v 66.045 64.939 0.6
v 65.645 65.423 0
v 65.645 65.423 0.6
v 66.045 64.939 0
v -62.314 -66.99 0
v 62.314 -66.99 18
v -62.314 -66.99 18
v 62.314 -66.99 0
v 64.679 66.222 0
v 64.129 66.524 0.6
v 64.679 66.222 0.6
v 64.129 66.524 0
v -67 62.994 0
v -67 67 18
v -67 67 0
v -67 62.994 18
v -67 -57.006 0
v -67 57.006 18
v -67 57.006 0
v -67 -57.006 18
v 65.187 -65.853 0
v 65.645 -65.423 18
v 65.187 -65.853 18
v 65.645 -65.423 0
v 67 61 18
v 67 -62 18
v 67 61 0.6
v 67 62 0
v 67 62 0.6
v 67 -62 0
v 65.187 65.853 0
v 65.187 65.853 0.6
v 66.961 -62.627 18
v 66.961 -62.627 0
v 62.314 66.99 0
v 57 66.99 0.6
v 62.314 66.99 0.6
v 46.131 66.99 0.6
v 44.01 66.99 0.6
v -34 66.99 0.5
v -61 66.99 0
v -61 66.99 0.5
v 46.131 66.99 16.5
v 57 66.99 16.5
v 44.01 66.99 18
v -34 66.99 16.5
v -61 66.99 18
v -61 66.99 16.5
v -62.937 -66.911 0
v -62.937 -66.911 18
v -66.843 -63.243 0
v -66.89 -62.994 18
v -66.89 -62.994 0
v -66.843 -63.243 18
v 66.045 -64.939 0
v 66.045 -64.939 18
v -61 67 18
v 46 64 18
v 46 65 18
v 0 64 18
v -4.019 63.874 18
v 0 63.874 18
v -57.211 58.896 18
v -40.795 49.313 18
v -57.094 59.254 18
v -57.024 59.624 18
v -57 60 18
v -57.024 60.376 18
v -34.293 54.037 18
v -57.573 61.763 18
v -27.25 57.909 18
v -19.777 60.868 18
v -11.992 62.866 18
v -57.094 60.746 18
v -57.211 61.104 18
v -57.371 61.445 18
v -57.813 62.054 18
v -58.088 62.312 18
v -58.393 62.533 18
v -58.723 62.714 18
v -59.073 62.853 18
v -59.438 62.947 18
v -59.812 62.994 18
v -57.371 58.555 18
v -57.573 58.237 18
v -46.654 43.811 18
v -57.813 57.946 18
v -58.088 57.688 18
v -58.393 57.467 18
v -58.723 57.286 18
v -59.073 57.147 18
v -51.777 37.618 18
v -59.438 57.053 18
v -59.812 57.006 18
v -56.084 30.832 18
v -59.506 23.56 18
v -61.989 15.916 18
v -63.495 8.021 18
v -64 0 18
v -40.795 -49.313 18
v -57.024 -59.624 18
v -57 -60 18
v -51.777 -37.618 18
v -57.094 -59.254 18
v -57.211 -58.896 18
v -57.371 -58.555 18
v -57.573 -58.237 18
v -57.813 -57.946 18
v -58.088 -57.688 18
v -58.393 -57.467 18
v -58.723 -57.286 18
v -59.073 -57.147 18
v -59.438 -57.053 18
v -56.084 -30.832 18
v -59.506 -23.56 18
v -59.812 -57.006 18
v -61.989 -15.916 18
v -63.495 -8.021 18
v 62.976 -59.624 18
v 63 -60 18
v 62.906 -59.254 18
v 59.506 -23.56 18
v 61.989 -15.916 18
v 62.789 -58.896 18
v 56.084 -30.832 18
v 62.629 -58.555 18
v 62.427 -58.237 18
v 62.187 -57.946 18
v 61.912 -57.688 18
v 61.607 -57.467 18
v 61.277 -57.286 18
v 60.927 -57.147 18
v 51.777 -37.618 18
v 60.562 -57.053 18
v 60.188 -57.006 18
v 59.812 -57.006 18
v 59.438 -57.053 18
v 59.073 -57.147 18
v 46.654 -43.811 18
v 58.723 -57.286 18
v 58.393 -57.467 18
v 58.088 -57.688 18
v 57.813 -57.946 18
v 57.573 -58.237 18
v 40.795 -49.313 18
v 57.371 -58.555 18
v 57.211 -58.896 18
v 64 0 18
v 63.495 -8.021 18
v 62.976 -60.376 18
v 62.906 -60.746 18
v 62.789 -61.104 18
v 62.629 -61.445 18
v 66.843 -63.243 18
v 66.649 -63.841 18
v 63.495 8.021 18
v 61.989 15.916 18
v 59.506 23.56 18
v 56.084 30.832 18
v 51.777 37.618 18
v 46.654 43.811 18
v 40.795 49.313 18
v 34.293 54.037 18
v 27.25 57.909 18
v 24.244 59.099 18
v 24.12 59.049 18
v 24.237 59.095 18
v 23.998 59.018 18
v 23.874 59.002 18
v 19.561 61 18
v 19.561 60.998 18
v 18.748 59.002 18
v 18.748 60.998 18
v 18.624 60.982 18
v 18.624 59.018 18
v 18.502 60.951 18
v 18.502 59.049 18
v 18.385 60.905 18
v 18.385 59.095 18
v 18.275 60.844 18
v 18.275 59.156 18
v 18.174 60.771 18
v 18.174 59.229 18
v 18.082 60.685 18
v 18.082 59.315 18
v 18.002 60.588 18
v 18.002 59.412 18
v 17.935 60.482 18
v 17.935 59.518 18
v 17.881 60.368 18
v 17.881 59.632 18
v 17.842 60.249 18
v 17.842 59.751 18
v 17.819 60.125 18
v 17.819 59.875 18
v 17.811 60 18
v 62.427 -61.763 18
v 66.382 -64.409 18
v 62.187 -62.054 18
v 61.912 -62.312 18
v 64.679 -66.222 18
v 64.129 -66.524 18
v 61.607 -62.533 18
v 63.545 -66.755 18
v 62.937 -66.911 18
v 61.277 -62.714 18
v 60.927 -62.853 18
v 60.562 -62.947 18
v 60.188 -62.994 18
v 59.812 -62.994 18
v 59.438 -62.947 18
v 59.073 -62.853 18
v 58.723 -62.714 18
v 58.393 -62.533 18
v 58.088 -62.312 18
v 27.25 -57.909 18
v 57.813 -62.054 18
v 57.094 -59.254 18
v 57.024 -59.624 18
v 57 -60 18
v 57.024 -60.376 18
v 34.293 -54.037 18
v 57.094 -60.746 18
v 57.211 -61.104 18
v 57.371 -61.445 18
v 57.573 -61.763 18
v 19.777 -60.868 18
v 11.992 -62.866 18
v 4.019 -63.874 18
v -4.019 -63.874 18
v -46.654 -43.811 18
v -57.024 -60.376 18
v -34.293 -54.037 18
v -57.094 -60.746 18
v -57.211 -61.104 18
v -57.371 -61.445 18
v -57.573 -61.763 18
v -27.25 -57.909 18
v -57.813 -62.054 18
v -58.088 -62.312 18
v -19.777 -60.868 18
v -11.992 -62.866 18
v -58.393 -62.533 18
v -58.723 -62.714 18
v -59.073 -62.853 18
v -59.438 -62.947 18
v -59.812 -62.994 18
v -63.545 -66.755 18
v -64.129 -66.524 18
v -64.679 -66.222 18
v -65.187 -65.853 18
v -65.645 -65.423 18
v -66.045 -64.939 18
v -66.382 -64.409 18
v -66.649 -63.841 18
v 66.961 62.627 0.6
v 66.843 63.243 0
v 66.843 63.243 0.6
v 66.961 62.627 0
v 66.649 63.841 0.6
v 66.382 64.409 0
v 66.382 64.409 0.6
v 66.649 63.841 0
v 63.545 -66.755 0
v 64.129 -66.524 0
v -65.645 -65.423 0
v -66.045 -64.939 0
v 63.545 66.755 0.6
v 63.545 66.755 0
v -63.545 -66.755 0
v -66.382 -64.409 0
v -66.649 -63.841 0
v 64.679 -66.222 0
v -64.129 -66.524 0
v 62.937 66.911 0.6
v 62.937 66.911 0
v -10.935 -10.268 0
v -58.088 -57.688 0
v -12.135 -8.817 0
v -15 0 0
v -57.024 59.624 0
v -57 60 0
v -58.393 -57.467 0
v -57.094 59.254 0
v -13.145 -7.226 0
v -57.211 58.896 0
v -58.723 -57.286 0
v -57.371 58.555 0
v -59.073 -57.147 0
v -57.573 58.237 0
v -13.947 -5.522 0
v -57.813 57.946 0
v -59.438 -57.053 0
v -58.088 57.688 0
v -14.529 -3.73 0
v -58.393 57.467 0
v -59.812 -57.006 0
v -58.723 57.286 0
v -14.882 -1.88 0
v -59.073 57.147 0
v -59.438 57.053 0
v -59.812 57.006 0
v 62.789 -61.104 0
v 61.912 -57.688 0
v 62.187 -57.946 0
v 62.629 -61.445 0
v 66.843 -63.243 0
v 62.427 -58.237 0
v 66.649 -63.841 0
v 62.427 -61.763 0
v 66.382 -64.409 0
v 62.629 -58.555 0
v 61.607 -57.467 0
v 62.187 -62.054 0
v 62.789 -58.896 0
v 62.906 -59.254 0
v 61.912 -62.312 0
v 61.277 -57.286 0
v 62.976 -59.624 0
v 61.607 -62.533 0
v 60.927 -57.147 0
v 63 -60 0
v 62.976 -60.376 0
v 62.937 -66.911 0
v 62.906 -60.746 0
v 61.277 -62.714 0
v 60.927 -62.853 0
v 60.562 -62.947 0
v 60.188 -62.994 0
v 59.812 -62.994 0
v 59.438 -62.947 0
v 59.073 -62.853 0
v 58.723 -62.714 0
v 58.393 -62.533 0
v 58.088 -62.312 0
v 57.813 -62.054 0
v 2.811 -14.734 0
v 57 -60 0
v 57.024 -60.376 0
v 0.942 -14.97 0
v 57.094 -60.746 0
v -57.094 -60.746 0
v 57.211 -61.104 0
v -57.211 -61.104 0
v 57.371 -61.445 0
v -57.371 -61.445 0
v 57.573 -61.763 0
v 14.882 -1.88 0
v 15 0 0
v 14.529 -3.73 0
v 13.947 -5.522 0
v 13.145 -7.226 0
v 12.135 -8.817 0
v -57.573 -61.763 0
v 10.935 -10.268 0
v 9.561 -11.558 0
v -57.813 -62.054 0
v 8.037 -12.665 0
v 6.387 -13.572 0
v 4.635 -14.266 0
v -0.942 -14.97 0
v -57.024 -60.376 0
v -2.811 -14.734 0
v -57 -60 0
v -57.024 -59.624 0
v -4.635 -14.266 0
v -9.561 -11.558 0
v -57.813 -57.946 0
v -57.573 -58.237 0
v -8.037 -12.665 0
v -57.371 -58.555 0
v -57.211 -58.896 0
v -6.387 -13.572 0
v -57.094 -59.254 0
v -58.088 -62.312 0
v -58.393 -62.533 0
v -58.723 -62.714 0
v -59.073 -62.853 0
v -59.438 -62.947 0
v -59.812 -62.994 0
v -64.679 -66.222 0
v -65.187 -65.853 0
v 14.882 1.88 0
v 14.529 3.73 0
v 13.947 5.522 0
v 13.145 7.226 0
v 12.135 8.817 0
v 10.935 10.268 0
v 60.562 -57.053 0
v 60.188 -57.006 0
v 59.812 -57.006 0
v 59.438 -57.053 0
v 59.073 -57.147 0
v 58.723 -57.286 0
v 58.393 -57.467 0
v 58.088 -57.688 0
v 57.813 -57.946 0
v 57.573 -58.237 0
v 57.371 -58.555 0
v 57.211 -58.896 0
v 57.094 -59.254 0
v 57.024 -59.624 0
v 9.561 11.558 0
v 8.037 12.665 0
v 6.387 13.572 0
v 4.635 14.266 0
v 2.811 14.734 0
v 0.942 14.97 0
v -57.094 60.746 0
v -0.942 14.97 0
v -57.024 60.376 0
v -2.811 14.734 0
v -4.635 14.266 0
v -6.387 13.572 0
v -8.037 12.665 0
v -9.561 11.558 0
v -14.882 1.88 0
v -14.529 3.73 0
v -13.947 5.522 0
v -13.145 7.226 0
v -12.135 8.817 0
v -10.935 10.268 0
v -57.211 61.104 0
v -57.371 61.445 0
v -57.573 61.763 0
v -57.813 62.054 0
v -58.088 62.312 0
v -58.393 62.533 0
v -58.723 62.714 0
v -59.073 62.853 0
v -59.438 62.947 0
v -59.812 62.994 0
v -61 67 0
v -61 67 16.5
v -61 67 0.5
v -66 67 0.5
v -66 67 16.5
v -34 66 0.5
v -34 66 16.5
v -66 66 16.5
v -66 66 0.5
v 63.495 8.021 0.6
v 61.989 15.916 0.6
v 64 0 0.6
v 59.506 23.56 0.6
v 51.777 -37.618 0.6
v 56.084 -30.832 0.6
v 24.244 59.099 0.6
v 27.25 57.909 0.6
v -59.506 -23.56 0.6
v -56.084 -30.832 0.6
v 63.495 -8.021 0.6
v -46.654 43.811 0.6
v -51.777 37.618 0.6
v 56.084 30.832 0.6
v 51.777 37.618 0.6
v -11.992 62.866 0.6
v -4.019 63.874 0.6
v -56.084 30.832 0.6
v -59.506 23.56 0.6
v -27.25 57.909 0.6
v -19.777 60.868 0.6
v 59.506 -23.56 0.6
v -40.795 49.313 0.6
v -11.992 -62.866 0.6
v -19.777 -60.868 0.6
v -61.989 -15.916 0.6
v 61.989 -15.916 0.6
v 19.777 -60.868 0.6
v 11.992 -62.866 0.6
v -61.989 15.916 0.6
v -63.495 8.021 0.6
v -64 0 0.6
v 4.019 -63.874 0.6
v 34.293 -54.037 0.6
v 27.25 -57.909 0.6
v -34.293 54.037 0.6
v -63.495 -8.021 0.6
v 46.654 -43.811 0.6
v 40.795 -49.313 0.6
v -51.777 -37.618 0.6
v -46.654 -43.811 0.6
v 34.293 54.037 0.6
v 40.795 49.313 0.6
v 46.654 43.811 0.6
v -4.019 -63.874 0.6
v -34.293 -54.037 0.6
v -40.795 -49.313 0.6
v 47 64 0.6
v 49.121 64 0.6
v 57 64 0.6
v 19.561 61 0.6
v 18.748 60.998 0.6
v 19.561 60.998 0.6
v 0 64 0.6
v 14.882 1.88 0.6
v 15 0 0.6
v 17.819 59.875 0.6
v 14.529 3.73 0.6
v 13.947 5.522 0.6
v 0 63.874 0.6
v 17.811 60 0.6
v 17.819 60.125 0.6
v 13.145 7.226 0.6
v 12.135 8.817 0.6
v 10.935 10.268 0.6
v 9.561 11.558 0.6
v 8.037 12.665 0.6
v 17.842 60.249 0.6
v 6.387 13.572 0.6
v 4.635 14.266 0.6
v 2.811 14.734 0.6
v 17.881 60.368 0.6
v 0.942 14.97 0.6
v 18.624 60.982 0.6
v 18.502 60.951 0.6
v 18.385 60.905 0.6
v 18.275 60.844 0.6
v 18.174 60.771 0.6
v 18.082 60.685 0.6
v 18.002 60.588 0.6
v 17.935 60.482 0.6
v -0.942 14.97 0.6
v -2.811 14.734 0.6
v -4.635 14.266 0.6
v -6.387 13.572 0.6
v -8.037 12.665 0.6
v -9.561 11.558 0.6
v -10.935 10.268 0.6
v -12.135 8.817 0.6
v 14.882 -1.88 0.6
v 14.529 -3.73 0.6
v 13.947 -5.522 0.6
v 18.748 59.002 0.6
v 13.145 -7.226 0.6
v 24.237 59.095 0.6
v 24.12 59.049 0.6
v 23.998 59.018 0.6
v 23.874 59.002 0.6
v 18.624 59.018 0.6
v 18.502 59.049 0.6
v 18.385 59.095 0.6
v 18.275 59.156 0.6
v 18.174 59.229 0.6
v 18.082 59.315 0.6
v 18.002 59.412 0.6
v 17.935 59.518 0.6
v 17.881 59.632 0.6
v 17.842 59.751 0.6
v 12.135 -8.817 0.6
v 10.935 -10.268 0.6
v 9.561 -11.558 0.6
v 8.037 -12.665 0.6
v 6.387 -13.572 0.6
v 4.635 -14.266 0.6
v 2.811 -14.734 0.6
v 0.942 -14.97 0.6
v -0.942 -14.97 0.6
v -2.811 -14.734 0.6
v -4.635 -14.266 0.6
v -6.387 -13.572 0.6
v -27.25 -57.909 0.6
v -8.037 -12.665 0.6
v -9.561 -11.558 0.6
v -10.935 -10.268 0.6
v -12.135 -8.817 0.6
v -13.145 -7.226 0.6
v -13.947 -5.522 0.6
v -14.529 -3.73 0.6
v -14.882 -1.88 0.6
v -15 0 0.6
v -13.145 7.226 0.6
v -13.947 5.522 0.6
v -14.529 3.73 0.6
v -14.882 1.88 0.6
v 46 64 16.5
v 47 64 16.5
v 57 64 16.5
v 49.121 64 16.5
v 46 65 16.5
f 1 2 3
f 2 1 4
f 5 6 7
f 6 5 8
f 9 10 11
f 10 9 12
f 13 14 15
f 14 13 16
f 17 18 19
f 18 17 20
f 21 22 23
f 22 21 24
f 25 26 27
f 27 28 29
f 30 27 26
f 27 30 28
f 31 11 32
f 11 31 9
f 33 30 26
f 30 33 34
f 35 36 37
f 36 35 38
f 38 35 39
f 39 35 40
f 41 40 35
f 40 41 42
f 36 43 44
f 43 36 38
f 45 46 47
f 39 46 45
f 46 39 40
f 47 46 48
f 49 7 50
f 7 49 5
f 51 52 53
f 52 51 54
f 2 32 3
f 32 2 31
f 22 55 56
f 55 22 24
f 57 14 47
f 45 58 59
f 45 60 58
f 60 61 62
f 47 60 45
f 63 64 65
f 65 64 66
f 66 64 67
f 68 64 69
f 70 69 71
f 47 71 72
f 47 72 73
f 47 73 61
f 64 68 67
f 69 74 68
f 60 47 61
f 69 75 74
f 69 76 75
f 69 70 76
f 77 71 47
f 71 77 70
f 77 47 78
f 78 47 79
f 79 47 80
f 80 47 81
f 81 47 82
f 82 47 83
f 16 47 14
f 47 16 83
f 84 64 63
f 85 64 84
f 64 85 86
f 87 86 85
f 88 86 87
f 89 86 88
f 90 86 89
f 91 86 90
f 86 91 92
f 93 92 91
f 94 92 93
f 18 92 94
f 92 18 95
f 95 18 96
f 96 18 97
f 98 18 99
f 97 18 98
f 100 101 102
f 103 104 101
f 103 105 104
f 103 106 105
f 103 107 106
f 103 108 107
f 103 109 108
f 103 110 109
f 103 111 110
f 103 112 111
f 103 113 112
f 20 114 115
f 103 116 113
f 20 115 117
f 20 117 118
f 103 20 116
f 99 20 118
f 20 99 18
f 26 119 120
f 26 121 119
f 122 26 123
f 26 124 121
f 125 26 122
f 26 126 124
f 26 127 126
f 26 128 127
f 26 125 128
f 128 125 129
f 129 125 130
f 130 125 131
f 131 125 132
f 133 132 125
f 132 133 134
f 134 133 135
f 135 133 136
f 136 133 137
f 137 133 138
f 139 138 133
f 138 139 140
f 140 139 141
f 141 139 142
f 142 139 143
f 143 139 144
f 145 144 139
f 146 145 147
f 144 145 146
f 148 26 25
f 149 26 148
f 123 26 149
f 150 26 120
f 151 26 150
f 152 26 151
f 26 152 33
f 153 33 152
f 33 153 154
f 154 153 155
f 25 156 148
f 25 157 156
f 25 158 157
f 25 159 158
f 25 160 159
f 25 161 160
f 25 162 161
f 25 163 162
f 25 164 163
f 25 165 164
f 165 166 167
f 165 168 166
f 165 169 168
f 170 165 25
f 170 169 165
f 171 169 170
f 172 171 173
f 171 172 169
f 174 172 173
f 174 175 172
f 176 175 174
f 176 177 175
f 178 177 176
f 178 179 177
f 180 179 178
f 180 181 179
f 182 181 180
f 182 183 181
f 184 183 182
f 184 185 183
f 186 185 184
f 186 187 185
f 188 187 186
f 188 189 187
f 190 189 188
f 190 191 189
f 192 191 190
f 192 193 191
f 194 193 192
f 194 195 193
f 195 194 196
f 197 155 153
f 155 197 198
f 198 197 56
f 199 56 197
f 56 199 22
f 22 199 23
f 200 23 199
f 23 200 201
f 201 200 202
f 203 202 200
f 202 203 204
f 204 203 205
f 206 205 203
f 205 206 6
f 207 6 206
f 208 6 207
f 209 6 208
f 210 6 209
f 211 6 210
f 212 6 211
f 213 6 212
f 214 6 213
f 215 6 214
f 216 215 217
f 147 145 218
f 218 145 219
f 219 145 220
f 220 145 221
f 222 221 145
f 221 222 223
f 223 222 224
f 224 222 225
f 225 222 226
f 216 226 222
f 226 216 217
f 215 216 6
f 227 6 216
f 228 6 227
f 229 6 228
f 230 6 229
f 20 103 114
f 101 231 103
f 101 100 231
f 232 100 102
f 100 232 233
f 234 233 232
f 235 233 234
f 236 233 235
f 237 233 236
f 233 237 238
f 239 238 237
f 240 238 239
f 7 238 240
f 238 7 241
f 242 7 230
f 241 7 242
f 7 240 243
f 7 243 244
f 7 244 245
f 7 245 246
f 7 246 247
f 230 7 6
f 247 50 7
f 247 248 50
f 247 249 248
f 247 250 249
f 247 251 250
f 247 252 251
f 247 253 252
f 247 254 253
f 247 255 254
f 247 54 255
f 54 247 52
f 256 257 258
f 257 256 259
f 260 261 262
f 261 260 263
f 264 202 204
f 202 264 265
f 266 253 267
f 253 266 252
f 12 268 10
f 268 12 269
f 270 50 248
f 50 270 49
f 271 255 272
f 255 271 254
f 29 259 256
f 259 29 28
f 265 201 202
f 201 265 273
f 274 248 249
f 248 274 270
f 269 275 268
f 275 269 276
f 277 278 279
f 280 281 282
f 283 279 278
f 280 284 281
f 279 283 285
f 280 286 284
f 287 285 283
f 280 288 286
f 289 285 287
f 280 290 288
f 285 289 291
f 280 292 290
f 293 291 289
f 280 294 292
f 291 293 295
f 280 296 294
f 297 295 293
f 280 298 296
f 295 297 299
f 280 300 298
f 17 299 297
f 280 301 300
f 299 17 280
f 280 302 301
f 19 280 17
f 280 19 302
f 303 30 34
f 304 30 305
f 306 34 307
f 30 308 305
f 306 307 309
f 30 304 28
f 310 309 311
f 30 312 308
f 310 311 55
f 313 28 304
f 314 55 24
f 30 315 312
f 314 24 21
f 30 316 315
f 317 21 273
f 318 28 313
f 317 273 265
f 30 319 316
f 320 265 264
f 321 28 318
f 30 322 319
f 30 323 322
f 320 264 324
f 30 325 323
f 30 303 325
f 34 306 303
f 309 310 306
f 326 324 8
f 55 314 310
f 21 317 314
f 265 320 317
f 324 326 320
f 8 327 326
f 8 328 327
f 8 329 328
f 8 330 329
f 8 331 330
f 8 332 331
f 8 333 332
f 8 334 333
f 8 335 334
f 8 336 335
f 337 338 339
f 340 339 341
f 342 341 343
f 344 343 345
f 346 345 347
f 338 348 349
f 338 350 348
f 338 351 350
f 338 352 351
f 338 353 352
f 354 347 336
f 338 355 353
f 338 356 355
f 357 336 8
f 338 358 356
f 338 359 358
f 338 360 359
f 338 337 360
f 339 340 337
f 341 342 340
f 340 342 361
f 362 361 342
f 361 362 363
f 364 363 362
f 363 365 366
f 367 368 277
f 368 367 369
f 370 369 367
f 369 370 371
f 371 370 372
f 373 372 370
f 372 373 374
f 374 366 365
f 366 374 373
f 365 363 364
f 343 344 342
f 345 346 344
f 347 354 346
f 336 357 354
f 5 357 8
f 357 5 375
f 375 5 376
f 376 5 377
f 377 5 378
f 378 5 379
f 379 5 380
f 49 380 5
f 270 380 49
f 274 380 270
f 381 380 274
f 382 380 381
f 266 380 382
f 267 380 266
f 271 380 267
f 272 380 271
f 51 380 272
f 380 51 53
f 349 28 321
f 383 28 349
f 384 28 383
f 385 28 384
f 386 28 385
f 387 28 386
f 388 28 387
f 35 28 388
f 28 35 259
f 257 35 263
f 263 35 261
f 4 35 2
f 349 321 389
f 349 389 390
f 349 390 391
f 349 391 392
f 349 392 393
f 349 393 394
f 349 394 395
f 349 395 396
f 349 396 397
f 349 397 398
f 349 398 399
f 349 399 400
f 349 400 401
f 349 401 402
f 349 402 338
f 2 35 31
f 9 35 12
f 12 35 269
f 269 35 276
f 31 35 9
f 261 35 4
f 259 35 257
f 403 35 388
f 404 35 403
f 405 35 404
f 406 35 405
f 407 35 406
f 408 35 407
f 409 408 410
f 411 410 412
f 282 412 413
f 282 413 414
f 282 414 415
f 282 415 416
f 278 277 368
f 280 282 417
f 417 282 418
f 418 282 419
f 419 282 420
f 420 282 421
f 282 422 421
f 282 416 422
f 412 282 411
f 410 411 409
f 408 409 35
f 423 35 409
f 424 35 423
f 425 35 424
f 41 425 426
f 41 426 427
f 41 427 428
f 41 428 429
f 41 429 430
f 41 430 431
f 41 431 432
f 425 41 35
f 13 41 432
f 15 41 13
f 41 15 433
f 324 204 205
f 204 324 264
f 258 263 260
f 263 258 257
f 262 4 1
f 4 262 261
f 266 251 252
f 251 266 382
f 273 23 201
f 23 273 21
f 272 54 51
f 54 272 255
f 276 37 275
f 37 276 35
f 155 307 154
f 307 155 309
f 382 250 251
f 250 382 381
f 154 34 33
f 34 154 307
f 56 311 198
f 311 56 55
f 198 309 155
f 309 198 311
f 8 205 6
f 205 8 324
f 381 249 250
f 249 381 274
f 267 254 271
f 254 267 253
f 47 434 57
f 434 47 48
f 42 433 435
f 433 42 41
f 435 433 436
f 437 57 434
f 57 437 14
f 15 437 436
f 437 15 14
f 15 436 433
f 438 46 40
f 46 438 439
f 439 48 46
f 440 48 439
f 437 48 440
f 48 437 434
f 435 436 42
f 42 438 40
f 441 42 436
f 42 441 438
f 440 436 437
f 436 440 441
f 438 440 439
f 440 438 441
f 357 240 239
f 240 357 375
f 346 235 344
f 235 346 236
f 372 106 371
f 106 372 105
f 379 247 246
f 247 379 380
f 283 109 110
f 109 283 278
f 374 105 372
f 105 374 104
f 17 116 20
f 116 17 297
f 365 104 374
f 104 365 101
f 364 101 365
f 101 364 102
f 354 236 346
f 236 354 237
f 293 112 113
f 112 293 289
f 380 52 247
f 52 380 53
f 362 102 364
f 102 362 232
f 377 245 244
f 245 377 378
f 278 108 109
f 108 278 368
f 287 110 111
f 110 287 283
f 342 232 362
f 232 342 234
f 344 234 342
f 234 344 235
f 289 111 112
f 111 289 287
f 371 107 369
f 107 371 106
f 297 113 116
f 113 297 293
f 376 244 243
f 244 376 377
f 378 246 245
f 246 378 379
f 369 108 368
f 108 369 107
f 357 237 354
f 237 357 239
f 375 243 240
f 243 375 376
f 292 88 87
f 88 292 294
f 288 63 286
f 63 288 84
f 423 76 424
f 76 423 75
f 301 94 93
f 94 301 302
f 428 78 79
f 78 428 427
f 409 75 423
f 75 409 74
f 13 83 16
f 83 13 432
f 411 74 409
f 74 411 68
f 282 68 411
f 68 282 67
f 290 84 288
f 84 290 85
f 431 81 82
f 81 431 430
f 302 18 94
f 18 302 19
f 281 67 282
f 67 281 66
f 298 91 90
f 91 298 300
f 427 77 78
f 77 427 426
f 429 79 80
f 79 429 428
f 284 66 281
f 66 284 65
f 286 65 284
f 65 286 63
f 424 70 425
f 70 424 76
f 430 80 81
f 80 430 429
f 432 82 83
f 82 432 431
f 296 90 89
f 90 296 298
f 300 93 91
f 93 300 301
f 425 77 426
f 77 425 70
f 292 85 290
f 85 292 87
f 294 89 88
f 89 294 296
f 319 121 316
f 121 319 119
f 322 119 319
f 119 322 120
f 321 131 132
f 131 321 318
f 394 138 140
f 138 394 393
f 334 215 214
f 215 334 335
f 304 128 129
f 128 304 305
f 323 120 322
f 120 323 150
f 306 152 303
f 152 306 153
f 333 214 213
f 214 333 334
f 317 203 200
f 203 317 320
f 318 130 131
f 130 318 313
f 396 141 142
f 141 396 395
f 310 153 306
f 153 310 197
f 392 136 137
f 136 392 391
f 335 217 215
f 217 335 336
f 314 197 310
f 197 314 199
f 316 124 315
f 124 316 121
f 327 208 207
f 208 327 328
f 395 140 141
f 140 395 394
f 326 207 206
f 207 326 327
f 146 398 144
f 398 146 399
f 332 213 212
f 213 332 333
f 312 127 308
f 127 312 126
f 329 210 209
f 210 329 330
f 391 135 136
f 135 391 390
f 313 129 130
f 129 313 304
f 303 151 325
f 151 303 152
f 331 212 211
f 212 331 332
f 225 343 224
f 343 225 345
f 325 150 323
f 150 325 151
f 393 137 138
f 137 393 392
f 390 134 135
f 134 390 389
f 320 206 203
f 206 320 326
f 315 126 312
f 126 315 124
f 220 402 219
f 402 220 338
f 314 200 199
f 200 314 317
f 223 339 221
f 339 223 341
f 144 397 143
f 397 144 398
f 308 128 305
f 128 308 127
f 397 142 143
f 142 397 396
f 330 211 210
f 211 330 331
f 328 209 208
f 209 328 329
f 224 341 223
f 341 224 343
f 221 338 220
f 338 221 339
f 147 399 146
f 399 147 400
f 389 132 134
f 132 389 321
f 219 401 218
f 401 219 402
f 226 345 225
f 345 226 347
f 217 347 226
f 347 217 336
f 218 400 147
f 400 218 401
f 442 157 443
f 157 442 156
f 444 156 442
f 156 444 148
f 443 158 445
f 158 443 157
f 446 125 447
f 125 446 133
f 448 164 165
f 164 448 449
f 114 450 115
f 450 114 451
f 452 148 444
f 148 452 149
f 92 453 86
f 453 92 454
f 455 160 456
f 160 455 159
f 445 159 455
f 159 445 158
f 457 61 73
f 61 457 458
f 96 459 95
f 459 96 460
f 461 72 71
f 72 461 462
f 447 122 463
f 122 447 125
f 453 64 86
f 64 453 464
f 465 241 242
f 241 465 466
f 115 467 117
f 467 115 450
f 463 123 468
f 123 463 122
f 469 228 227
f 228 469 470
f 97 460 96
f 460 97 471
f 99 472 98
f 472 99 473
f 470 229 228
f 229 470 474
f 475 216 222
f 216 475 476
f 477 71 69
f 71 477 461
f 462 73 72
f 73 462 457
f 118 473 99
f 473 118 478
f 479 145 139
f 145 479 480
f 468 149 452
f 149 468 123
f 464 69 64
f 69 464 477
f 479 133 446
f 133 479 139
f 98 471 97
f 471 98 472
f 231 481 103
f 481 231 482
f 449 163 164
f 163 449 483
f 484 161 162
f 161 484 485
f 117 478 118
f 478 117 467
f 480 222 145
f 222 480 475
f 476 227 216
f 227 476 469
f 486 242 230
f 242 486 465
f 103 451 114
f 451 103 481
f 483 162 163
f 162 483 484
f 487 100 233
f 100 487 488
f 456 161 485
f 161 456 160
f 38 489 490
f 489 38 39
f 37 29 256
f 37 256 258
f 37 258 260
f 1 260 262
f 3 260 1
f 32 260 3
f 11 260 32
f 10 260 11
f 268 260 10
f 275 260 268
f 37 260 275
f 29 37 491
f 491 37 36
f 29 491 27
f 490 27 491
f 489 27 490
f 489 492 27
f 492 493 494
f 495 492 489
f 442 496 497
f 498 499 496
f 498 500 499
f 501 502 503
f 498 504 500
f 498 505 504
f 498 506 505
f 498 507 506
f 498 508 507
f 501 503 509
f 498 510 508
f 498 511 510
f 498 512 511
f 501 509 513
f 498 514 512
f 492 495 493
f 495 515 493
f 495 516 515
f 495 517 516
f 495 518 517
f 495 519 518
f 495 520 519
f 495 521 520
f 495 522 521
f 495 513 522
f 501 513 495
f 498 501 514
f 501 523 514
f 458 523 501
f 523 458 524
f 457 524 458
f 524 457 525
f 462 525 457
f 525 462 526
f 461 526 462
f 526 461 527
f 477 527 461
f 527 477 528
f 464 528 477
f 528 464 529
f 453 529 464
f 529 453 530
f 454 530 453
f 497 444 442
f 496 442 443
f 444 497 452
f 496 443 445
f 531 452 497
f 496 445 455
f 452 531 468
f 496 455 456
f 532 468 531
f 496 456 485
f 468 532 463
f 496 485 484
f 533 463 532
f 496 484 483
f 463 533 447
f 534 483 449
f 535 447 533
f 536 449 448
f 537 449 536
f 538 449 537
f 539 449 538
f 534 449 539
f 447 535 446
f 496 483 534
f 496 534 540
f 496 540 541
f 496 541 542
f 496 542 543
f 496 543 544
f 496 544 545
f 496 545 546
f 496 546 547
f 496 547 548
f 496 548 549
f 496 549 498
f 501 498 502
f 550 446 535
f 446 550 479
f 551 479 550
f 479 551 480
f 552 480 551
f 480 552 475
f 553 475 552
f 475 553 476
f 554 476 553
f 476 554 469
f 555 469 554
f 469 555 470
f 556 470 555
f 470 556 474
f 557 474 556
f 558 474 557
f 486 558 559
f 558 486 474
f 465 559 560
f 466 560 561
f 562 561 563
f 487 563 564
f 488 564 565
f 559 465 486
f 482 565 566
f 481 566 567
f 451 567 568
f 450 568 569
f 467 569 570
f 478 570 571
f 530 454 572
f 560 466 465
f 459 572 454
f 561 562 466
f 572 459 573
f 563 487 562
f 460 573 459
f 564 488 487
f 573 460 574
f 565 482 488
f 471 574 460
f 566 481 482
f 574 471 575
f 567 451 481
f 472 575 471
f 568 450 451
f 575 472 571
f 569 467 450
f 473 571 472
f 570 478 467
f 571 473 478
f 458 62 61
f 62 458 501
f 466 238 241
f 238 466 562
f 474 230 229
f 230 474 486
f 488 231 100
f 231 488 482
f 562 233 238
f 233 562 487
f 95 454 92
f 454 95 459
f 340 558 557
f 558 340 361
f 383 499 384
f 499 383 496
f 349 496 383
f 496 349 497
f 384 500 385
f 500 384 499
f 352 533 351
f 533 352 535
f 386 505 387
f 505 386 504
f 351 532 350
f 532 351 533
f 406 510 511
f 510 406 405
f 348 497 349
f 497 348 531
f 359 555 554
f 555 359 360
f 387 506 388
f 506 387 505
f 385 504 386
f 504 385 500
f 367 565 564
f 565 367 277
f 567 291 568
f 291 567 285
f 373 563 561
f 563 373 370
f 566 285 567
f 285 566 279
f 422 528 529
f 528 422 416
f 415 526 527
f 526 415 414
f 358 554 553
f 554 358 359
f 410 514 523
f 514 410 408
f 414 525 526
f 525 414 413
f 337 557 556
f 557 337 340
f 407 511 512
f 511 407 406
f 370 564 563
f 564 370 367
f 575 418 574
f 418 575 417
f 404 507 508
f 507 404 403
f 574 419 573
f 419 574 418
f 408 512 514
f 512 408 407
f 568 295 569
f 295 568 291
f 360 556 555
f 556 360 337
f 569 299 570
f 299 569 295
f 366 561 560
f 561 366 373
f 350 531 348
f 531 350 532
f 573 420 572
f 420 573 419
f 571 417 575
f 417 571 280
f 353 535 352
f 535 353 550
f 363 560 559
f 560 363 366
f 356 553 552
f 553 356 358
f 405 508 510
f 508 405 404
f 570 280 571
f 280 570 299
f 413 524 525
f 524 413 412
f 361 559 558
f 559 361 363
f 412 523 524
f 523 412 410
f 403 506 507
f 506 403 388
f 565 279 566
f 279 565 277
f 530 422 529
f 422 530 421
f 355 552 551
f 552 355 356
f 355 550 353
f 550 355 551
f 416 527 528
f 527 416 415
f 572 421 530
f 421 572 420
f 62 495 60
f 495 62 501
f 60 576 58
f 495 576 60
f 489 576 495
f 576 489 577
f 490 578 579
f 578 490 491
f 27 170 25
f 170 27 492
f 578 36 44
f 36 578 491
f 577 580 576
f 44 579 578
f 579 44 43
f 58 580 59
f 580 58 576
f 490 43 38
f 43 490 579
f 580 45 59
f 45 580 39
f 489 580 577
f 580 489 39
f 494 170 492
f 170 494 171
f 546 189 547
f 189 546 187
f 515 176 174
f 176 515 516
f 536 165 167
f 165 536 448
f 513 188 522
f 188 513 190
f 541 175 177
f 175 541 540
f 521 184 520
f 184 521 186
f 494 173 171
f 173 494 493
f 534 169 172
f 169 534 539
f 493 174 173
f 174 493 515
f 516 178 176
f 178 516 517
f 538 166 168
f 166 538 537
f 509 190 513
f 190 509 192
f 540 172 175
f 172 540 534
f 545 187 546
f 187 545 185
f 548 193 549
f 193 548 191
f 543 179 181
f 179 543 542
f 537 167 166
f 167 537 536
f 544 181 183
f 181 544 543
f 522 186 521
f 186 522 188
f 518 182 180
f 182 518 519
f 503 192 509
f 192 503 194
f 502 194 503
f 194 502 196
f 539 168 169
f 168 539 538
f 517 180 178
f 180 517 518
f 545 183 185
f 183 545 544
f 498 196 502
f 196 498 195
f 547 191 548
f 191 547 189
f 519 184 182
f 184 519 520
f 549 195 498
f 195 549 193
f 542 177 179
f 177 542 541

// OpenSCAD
$fn = 50;


union() {
	difference() {
		union() {
			translate(v = [0, 0, 0]) {
				rotate(a = [0, 0, 0]) {
					hull() {
						translate(v = [-62.0000000000, 62.0000000000, 0]) {
							rotate(a = [0, 0, 0]) {
								translate(v = [0, 0, 0]) {
									rotate(a = [0, 0, 0]) {
										cylinder(h = 18, r = 5);
									}
								}
							}
						}
						translate(v = [62.0000000000, 62.0000000000, 0]) {
							rotate(a = [0, 0, 0]) {
								translate(v = [0, 0, 0]) {
									rotate(a = [0, 0, 0]) {
										cylinder(h = 18, r = 5);
									}
								}
							}
						}
						translate(v = [-62.0000000000, -62.0000000000, 0]) {
							rotate(a = [0, 0, 0]) {
								translate(v = [0, 0, 0]) {
									rotate(a = [0, 0, 0]) {
										cylinder(h = 18, r = 5);
									}
								}
							}
						}
						translate(v = [62.0000000000, -62.0000000000, 0]) {
							rotate(a = [0, 0, 0]) {
								translate(v = [0, 0, 0]) {
									rotate(a = [0, 0, 0]) {
										cylinder(h = 18, r = 5);
									}
								}
							}
						}
					}
				}
			}
			translate(v = [-67.0000000000, 61.0000000000, 0]) {
				rotate(a = [0, 0, 0]) {
					cube(size = [6, 6, 18]);
				}
			}
		}
		union() {
			#translate(v = [-66.0000000000, 66.0000000000, 0.5000000000]) {
				rotate(a = [0, 0, 0]) {
					cube(size = [32, 1, 16]);
				}
			}
			translate(v = [-67.5000000000, -60.0000000000, -125]) {
				rotate(a = [0, 0, 0]) {
					hull() {
						translate(v = [7.5000000000, 0, 0]) {
							rotate(a = [0, 0, 0]) {
								translate(v = [0, 0, 0]) {
									rotate(a = [0, 0, 0]) {
										cylinder(h = 250, r = 3.0000000000);
									}
								}
							}
						}
						translate(v = [-7.5000000000, 0, 0]) {
							rotate(a = [0, 0, 0]) {
								translate(v = [0, 0, 0]) {
									rotate(a = [0, 0, 0]) {
										cylinder(h = 250, r = 3.0000000000);
									}
								}
							}
						}
					}
				}
			}
			translate(v = [-67.5000000000, 60.0000000000, -125]) {
				rotate(a = [0, 0, 0]) {
					hull() {
						translate(v = [7.5000000000, 0, 0]) {
							rotate(a = [0, 0, 0]) {
								translate(v = [0, 0, 0]) {
									rotate(a = [0, 0, 0]) {
										cylinder(h = 250, r = 3.0000000000);
									}
								}
							}
						}
						translate(v = [-7.5000000000, 0, 0]) {
							rotate(a = [0, 0, 0]) {
								translate(v = [0, 0, 0]) {
									rotate(a = [0, 0, 0]) {
										cylinder(h = 250, r = 3.0000000000);
									}
								}
							}
						}
					}
				}
			}
			translate(v = [60.0000000000, -60.0000000000, -125.0000000000]) {
				rotate(a = [0, 0, 0]) {
					cylinder(h = 250, r = 3.0000000000);
				}
			}
			translate(v = [0, 0, 0.6000000000]) {
				rotate(a = [0, 0, 0]) {
					cylinder(h = 20.4000000000, r = 64.0000000000);
				}
			}
			translate(v = [0, 0, -9.0000000000]) {
				rotate(a = [0, 0, 0]) {
					cylinder(h = 18, r = 15.0000000000);
				}
			}
			translate(v = [0.0000000000, 61.0000000000, 0.6000000000]) {
				rotate(a = [0, 0, 0]) {
					cube(size = [67.0000000000, 3, 20.4000000000]);
				}
			}
			translate(v = [57.0000000000, 61.0000000000, 0.6000000000]) {
				rotate(a = [0, 0, 0]) {
					cube(size = [10, 6, 20.4000000000]);
				}
			}
			translate(v = [46.0000000000, 61.0000000000, 16.5000000000]) {
				rotate(a = [0, 0, 0]) {
					cube(size = [21, 6, 1.5000000000]);
				}
			}
			translate(v = [43.2500000000, 67.7500000000, 0.6000000000]) {
				rotate(a = [0, 0, -45]) {
					cube(size = [7.5000000000, 1.5000000000, 20.4000000000]);
				}
			}
			translate(v = [12.0610000000, 59.0000000000, 0.6000000000]) {
				rotate(a = [0, 0, 0]) {
					cube(size = [7.5000000000, 2, 17.4000000000]);
				}
			}
		}
	}
	union() {
		translate(v = [21.3110000000, 60.0000000000, 0]) {
			rotate(a = [0, 0, 0]) {
				hull() {
					translate(v = [2.5000000000, 0, 0]) {
						rotate(a = [0, 0, 0]) {
							#translate(v = [0, 0, 0]) {
								rotate(a = [0, 0, 0]) {
									cylinder(h = 18, r = 1.0000000000);
								}
							}
						}
					}
					translate(v = [-2.5000000000, 0, 0]) {
						rotate(a = [0, 0, 0]) {
							#translate(v = [0, 0, 0]) {
								rotate(a = [0, 0, 0]) {
									cylinder(h = 18, r = 1.0000000000);
								}
							}
						}
					}
				}
			}
		}
	}
}
